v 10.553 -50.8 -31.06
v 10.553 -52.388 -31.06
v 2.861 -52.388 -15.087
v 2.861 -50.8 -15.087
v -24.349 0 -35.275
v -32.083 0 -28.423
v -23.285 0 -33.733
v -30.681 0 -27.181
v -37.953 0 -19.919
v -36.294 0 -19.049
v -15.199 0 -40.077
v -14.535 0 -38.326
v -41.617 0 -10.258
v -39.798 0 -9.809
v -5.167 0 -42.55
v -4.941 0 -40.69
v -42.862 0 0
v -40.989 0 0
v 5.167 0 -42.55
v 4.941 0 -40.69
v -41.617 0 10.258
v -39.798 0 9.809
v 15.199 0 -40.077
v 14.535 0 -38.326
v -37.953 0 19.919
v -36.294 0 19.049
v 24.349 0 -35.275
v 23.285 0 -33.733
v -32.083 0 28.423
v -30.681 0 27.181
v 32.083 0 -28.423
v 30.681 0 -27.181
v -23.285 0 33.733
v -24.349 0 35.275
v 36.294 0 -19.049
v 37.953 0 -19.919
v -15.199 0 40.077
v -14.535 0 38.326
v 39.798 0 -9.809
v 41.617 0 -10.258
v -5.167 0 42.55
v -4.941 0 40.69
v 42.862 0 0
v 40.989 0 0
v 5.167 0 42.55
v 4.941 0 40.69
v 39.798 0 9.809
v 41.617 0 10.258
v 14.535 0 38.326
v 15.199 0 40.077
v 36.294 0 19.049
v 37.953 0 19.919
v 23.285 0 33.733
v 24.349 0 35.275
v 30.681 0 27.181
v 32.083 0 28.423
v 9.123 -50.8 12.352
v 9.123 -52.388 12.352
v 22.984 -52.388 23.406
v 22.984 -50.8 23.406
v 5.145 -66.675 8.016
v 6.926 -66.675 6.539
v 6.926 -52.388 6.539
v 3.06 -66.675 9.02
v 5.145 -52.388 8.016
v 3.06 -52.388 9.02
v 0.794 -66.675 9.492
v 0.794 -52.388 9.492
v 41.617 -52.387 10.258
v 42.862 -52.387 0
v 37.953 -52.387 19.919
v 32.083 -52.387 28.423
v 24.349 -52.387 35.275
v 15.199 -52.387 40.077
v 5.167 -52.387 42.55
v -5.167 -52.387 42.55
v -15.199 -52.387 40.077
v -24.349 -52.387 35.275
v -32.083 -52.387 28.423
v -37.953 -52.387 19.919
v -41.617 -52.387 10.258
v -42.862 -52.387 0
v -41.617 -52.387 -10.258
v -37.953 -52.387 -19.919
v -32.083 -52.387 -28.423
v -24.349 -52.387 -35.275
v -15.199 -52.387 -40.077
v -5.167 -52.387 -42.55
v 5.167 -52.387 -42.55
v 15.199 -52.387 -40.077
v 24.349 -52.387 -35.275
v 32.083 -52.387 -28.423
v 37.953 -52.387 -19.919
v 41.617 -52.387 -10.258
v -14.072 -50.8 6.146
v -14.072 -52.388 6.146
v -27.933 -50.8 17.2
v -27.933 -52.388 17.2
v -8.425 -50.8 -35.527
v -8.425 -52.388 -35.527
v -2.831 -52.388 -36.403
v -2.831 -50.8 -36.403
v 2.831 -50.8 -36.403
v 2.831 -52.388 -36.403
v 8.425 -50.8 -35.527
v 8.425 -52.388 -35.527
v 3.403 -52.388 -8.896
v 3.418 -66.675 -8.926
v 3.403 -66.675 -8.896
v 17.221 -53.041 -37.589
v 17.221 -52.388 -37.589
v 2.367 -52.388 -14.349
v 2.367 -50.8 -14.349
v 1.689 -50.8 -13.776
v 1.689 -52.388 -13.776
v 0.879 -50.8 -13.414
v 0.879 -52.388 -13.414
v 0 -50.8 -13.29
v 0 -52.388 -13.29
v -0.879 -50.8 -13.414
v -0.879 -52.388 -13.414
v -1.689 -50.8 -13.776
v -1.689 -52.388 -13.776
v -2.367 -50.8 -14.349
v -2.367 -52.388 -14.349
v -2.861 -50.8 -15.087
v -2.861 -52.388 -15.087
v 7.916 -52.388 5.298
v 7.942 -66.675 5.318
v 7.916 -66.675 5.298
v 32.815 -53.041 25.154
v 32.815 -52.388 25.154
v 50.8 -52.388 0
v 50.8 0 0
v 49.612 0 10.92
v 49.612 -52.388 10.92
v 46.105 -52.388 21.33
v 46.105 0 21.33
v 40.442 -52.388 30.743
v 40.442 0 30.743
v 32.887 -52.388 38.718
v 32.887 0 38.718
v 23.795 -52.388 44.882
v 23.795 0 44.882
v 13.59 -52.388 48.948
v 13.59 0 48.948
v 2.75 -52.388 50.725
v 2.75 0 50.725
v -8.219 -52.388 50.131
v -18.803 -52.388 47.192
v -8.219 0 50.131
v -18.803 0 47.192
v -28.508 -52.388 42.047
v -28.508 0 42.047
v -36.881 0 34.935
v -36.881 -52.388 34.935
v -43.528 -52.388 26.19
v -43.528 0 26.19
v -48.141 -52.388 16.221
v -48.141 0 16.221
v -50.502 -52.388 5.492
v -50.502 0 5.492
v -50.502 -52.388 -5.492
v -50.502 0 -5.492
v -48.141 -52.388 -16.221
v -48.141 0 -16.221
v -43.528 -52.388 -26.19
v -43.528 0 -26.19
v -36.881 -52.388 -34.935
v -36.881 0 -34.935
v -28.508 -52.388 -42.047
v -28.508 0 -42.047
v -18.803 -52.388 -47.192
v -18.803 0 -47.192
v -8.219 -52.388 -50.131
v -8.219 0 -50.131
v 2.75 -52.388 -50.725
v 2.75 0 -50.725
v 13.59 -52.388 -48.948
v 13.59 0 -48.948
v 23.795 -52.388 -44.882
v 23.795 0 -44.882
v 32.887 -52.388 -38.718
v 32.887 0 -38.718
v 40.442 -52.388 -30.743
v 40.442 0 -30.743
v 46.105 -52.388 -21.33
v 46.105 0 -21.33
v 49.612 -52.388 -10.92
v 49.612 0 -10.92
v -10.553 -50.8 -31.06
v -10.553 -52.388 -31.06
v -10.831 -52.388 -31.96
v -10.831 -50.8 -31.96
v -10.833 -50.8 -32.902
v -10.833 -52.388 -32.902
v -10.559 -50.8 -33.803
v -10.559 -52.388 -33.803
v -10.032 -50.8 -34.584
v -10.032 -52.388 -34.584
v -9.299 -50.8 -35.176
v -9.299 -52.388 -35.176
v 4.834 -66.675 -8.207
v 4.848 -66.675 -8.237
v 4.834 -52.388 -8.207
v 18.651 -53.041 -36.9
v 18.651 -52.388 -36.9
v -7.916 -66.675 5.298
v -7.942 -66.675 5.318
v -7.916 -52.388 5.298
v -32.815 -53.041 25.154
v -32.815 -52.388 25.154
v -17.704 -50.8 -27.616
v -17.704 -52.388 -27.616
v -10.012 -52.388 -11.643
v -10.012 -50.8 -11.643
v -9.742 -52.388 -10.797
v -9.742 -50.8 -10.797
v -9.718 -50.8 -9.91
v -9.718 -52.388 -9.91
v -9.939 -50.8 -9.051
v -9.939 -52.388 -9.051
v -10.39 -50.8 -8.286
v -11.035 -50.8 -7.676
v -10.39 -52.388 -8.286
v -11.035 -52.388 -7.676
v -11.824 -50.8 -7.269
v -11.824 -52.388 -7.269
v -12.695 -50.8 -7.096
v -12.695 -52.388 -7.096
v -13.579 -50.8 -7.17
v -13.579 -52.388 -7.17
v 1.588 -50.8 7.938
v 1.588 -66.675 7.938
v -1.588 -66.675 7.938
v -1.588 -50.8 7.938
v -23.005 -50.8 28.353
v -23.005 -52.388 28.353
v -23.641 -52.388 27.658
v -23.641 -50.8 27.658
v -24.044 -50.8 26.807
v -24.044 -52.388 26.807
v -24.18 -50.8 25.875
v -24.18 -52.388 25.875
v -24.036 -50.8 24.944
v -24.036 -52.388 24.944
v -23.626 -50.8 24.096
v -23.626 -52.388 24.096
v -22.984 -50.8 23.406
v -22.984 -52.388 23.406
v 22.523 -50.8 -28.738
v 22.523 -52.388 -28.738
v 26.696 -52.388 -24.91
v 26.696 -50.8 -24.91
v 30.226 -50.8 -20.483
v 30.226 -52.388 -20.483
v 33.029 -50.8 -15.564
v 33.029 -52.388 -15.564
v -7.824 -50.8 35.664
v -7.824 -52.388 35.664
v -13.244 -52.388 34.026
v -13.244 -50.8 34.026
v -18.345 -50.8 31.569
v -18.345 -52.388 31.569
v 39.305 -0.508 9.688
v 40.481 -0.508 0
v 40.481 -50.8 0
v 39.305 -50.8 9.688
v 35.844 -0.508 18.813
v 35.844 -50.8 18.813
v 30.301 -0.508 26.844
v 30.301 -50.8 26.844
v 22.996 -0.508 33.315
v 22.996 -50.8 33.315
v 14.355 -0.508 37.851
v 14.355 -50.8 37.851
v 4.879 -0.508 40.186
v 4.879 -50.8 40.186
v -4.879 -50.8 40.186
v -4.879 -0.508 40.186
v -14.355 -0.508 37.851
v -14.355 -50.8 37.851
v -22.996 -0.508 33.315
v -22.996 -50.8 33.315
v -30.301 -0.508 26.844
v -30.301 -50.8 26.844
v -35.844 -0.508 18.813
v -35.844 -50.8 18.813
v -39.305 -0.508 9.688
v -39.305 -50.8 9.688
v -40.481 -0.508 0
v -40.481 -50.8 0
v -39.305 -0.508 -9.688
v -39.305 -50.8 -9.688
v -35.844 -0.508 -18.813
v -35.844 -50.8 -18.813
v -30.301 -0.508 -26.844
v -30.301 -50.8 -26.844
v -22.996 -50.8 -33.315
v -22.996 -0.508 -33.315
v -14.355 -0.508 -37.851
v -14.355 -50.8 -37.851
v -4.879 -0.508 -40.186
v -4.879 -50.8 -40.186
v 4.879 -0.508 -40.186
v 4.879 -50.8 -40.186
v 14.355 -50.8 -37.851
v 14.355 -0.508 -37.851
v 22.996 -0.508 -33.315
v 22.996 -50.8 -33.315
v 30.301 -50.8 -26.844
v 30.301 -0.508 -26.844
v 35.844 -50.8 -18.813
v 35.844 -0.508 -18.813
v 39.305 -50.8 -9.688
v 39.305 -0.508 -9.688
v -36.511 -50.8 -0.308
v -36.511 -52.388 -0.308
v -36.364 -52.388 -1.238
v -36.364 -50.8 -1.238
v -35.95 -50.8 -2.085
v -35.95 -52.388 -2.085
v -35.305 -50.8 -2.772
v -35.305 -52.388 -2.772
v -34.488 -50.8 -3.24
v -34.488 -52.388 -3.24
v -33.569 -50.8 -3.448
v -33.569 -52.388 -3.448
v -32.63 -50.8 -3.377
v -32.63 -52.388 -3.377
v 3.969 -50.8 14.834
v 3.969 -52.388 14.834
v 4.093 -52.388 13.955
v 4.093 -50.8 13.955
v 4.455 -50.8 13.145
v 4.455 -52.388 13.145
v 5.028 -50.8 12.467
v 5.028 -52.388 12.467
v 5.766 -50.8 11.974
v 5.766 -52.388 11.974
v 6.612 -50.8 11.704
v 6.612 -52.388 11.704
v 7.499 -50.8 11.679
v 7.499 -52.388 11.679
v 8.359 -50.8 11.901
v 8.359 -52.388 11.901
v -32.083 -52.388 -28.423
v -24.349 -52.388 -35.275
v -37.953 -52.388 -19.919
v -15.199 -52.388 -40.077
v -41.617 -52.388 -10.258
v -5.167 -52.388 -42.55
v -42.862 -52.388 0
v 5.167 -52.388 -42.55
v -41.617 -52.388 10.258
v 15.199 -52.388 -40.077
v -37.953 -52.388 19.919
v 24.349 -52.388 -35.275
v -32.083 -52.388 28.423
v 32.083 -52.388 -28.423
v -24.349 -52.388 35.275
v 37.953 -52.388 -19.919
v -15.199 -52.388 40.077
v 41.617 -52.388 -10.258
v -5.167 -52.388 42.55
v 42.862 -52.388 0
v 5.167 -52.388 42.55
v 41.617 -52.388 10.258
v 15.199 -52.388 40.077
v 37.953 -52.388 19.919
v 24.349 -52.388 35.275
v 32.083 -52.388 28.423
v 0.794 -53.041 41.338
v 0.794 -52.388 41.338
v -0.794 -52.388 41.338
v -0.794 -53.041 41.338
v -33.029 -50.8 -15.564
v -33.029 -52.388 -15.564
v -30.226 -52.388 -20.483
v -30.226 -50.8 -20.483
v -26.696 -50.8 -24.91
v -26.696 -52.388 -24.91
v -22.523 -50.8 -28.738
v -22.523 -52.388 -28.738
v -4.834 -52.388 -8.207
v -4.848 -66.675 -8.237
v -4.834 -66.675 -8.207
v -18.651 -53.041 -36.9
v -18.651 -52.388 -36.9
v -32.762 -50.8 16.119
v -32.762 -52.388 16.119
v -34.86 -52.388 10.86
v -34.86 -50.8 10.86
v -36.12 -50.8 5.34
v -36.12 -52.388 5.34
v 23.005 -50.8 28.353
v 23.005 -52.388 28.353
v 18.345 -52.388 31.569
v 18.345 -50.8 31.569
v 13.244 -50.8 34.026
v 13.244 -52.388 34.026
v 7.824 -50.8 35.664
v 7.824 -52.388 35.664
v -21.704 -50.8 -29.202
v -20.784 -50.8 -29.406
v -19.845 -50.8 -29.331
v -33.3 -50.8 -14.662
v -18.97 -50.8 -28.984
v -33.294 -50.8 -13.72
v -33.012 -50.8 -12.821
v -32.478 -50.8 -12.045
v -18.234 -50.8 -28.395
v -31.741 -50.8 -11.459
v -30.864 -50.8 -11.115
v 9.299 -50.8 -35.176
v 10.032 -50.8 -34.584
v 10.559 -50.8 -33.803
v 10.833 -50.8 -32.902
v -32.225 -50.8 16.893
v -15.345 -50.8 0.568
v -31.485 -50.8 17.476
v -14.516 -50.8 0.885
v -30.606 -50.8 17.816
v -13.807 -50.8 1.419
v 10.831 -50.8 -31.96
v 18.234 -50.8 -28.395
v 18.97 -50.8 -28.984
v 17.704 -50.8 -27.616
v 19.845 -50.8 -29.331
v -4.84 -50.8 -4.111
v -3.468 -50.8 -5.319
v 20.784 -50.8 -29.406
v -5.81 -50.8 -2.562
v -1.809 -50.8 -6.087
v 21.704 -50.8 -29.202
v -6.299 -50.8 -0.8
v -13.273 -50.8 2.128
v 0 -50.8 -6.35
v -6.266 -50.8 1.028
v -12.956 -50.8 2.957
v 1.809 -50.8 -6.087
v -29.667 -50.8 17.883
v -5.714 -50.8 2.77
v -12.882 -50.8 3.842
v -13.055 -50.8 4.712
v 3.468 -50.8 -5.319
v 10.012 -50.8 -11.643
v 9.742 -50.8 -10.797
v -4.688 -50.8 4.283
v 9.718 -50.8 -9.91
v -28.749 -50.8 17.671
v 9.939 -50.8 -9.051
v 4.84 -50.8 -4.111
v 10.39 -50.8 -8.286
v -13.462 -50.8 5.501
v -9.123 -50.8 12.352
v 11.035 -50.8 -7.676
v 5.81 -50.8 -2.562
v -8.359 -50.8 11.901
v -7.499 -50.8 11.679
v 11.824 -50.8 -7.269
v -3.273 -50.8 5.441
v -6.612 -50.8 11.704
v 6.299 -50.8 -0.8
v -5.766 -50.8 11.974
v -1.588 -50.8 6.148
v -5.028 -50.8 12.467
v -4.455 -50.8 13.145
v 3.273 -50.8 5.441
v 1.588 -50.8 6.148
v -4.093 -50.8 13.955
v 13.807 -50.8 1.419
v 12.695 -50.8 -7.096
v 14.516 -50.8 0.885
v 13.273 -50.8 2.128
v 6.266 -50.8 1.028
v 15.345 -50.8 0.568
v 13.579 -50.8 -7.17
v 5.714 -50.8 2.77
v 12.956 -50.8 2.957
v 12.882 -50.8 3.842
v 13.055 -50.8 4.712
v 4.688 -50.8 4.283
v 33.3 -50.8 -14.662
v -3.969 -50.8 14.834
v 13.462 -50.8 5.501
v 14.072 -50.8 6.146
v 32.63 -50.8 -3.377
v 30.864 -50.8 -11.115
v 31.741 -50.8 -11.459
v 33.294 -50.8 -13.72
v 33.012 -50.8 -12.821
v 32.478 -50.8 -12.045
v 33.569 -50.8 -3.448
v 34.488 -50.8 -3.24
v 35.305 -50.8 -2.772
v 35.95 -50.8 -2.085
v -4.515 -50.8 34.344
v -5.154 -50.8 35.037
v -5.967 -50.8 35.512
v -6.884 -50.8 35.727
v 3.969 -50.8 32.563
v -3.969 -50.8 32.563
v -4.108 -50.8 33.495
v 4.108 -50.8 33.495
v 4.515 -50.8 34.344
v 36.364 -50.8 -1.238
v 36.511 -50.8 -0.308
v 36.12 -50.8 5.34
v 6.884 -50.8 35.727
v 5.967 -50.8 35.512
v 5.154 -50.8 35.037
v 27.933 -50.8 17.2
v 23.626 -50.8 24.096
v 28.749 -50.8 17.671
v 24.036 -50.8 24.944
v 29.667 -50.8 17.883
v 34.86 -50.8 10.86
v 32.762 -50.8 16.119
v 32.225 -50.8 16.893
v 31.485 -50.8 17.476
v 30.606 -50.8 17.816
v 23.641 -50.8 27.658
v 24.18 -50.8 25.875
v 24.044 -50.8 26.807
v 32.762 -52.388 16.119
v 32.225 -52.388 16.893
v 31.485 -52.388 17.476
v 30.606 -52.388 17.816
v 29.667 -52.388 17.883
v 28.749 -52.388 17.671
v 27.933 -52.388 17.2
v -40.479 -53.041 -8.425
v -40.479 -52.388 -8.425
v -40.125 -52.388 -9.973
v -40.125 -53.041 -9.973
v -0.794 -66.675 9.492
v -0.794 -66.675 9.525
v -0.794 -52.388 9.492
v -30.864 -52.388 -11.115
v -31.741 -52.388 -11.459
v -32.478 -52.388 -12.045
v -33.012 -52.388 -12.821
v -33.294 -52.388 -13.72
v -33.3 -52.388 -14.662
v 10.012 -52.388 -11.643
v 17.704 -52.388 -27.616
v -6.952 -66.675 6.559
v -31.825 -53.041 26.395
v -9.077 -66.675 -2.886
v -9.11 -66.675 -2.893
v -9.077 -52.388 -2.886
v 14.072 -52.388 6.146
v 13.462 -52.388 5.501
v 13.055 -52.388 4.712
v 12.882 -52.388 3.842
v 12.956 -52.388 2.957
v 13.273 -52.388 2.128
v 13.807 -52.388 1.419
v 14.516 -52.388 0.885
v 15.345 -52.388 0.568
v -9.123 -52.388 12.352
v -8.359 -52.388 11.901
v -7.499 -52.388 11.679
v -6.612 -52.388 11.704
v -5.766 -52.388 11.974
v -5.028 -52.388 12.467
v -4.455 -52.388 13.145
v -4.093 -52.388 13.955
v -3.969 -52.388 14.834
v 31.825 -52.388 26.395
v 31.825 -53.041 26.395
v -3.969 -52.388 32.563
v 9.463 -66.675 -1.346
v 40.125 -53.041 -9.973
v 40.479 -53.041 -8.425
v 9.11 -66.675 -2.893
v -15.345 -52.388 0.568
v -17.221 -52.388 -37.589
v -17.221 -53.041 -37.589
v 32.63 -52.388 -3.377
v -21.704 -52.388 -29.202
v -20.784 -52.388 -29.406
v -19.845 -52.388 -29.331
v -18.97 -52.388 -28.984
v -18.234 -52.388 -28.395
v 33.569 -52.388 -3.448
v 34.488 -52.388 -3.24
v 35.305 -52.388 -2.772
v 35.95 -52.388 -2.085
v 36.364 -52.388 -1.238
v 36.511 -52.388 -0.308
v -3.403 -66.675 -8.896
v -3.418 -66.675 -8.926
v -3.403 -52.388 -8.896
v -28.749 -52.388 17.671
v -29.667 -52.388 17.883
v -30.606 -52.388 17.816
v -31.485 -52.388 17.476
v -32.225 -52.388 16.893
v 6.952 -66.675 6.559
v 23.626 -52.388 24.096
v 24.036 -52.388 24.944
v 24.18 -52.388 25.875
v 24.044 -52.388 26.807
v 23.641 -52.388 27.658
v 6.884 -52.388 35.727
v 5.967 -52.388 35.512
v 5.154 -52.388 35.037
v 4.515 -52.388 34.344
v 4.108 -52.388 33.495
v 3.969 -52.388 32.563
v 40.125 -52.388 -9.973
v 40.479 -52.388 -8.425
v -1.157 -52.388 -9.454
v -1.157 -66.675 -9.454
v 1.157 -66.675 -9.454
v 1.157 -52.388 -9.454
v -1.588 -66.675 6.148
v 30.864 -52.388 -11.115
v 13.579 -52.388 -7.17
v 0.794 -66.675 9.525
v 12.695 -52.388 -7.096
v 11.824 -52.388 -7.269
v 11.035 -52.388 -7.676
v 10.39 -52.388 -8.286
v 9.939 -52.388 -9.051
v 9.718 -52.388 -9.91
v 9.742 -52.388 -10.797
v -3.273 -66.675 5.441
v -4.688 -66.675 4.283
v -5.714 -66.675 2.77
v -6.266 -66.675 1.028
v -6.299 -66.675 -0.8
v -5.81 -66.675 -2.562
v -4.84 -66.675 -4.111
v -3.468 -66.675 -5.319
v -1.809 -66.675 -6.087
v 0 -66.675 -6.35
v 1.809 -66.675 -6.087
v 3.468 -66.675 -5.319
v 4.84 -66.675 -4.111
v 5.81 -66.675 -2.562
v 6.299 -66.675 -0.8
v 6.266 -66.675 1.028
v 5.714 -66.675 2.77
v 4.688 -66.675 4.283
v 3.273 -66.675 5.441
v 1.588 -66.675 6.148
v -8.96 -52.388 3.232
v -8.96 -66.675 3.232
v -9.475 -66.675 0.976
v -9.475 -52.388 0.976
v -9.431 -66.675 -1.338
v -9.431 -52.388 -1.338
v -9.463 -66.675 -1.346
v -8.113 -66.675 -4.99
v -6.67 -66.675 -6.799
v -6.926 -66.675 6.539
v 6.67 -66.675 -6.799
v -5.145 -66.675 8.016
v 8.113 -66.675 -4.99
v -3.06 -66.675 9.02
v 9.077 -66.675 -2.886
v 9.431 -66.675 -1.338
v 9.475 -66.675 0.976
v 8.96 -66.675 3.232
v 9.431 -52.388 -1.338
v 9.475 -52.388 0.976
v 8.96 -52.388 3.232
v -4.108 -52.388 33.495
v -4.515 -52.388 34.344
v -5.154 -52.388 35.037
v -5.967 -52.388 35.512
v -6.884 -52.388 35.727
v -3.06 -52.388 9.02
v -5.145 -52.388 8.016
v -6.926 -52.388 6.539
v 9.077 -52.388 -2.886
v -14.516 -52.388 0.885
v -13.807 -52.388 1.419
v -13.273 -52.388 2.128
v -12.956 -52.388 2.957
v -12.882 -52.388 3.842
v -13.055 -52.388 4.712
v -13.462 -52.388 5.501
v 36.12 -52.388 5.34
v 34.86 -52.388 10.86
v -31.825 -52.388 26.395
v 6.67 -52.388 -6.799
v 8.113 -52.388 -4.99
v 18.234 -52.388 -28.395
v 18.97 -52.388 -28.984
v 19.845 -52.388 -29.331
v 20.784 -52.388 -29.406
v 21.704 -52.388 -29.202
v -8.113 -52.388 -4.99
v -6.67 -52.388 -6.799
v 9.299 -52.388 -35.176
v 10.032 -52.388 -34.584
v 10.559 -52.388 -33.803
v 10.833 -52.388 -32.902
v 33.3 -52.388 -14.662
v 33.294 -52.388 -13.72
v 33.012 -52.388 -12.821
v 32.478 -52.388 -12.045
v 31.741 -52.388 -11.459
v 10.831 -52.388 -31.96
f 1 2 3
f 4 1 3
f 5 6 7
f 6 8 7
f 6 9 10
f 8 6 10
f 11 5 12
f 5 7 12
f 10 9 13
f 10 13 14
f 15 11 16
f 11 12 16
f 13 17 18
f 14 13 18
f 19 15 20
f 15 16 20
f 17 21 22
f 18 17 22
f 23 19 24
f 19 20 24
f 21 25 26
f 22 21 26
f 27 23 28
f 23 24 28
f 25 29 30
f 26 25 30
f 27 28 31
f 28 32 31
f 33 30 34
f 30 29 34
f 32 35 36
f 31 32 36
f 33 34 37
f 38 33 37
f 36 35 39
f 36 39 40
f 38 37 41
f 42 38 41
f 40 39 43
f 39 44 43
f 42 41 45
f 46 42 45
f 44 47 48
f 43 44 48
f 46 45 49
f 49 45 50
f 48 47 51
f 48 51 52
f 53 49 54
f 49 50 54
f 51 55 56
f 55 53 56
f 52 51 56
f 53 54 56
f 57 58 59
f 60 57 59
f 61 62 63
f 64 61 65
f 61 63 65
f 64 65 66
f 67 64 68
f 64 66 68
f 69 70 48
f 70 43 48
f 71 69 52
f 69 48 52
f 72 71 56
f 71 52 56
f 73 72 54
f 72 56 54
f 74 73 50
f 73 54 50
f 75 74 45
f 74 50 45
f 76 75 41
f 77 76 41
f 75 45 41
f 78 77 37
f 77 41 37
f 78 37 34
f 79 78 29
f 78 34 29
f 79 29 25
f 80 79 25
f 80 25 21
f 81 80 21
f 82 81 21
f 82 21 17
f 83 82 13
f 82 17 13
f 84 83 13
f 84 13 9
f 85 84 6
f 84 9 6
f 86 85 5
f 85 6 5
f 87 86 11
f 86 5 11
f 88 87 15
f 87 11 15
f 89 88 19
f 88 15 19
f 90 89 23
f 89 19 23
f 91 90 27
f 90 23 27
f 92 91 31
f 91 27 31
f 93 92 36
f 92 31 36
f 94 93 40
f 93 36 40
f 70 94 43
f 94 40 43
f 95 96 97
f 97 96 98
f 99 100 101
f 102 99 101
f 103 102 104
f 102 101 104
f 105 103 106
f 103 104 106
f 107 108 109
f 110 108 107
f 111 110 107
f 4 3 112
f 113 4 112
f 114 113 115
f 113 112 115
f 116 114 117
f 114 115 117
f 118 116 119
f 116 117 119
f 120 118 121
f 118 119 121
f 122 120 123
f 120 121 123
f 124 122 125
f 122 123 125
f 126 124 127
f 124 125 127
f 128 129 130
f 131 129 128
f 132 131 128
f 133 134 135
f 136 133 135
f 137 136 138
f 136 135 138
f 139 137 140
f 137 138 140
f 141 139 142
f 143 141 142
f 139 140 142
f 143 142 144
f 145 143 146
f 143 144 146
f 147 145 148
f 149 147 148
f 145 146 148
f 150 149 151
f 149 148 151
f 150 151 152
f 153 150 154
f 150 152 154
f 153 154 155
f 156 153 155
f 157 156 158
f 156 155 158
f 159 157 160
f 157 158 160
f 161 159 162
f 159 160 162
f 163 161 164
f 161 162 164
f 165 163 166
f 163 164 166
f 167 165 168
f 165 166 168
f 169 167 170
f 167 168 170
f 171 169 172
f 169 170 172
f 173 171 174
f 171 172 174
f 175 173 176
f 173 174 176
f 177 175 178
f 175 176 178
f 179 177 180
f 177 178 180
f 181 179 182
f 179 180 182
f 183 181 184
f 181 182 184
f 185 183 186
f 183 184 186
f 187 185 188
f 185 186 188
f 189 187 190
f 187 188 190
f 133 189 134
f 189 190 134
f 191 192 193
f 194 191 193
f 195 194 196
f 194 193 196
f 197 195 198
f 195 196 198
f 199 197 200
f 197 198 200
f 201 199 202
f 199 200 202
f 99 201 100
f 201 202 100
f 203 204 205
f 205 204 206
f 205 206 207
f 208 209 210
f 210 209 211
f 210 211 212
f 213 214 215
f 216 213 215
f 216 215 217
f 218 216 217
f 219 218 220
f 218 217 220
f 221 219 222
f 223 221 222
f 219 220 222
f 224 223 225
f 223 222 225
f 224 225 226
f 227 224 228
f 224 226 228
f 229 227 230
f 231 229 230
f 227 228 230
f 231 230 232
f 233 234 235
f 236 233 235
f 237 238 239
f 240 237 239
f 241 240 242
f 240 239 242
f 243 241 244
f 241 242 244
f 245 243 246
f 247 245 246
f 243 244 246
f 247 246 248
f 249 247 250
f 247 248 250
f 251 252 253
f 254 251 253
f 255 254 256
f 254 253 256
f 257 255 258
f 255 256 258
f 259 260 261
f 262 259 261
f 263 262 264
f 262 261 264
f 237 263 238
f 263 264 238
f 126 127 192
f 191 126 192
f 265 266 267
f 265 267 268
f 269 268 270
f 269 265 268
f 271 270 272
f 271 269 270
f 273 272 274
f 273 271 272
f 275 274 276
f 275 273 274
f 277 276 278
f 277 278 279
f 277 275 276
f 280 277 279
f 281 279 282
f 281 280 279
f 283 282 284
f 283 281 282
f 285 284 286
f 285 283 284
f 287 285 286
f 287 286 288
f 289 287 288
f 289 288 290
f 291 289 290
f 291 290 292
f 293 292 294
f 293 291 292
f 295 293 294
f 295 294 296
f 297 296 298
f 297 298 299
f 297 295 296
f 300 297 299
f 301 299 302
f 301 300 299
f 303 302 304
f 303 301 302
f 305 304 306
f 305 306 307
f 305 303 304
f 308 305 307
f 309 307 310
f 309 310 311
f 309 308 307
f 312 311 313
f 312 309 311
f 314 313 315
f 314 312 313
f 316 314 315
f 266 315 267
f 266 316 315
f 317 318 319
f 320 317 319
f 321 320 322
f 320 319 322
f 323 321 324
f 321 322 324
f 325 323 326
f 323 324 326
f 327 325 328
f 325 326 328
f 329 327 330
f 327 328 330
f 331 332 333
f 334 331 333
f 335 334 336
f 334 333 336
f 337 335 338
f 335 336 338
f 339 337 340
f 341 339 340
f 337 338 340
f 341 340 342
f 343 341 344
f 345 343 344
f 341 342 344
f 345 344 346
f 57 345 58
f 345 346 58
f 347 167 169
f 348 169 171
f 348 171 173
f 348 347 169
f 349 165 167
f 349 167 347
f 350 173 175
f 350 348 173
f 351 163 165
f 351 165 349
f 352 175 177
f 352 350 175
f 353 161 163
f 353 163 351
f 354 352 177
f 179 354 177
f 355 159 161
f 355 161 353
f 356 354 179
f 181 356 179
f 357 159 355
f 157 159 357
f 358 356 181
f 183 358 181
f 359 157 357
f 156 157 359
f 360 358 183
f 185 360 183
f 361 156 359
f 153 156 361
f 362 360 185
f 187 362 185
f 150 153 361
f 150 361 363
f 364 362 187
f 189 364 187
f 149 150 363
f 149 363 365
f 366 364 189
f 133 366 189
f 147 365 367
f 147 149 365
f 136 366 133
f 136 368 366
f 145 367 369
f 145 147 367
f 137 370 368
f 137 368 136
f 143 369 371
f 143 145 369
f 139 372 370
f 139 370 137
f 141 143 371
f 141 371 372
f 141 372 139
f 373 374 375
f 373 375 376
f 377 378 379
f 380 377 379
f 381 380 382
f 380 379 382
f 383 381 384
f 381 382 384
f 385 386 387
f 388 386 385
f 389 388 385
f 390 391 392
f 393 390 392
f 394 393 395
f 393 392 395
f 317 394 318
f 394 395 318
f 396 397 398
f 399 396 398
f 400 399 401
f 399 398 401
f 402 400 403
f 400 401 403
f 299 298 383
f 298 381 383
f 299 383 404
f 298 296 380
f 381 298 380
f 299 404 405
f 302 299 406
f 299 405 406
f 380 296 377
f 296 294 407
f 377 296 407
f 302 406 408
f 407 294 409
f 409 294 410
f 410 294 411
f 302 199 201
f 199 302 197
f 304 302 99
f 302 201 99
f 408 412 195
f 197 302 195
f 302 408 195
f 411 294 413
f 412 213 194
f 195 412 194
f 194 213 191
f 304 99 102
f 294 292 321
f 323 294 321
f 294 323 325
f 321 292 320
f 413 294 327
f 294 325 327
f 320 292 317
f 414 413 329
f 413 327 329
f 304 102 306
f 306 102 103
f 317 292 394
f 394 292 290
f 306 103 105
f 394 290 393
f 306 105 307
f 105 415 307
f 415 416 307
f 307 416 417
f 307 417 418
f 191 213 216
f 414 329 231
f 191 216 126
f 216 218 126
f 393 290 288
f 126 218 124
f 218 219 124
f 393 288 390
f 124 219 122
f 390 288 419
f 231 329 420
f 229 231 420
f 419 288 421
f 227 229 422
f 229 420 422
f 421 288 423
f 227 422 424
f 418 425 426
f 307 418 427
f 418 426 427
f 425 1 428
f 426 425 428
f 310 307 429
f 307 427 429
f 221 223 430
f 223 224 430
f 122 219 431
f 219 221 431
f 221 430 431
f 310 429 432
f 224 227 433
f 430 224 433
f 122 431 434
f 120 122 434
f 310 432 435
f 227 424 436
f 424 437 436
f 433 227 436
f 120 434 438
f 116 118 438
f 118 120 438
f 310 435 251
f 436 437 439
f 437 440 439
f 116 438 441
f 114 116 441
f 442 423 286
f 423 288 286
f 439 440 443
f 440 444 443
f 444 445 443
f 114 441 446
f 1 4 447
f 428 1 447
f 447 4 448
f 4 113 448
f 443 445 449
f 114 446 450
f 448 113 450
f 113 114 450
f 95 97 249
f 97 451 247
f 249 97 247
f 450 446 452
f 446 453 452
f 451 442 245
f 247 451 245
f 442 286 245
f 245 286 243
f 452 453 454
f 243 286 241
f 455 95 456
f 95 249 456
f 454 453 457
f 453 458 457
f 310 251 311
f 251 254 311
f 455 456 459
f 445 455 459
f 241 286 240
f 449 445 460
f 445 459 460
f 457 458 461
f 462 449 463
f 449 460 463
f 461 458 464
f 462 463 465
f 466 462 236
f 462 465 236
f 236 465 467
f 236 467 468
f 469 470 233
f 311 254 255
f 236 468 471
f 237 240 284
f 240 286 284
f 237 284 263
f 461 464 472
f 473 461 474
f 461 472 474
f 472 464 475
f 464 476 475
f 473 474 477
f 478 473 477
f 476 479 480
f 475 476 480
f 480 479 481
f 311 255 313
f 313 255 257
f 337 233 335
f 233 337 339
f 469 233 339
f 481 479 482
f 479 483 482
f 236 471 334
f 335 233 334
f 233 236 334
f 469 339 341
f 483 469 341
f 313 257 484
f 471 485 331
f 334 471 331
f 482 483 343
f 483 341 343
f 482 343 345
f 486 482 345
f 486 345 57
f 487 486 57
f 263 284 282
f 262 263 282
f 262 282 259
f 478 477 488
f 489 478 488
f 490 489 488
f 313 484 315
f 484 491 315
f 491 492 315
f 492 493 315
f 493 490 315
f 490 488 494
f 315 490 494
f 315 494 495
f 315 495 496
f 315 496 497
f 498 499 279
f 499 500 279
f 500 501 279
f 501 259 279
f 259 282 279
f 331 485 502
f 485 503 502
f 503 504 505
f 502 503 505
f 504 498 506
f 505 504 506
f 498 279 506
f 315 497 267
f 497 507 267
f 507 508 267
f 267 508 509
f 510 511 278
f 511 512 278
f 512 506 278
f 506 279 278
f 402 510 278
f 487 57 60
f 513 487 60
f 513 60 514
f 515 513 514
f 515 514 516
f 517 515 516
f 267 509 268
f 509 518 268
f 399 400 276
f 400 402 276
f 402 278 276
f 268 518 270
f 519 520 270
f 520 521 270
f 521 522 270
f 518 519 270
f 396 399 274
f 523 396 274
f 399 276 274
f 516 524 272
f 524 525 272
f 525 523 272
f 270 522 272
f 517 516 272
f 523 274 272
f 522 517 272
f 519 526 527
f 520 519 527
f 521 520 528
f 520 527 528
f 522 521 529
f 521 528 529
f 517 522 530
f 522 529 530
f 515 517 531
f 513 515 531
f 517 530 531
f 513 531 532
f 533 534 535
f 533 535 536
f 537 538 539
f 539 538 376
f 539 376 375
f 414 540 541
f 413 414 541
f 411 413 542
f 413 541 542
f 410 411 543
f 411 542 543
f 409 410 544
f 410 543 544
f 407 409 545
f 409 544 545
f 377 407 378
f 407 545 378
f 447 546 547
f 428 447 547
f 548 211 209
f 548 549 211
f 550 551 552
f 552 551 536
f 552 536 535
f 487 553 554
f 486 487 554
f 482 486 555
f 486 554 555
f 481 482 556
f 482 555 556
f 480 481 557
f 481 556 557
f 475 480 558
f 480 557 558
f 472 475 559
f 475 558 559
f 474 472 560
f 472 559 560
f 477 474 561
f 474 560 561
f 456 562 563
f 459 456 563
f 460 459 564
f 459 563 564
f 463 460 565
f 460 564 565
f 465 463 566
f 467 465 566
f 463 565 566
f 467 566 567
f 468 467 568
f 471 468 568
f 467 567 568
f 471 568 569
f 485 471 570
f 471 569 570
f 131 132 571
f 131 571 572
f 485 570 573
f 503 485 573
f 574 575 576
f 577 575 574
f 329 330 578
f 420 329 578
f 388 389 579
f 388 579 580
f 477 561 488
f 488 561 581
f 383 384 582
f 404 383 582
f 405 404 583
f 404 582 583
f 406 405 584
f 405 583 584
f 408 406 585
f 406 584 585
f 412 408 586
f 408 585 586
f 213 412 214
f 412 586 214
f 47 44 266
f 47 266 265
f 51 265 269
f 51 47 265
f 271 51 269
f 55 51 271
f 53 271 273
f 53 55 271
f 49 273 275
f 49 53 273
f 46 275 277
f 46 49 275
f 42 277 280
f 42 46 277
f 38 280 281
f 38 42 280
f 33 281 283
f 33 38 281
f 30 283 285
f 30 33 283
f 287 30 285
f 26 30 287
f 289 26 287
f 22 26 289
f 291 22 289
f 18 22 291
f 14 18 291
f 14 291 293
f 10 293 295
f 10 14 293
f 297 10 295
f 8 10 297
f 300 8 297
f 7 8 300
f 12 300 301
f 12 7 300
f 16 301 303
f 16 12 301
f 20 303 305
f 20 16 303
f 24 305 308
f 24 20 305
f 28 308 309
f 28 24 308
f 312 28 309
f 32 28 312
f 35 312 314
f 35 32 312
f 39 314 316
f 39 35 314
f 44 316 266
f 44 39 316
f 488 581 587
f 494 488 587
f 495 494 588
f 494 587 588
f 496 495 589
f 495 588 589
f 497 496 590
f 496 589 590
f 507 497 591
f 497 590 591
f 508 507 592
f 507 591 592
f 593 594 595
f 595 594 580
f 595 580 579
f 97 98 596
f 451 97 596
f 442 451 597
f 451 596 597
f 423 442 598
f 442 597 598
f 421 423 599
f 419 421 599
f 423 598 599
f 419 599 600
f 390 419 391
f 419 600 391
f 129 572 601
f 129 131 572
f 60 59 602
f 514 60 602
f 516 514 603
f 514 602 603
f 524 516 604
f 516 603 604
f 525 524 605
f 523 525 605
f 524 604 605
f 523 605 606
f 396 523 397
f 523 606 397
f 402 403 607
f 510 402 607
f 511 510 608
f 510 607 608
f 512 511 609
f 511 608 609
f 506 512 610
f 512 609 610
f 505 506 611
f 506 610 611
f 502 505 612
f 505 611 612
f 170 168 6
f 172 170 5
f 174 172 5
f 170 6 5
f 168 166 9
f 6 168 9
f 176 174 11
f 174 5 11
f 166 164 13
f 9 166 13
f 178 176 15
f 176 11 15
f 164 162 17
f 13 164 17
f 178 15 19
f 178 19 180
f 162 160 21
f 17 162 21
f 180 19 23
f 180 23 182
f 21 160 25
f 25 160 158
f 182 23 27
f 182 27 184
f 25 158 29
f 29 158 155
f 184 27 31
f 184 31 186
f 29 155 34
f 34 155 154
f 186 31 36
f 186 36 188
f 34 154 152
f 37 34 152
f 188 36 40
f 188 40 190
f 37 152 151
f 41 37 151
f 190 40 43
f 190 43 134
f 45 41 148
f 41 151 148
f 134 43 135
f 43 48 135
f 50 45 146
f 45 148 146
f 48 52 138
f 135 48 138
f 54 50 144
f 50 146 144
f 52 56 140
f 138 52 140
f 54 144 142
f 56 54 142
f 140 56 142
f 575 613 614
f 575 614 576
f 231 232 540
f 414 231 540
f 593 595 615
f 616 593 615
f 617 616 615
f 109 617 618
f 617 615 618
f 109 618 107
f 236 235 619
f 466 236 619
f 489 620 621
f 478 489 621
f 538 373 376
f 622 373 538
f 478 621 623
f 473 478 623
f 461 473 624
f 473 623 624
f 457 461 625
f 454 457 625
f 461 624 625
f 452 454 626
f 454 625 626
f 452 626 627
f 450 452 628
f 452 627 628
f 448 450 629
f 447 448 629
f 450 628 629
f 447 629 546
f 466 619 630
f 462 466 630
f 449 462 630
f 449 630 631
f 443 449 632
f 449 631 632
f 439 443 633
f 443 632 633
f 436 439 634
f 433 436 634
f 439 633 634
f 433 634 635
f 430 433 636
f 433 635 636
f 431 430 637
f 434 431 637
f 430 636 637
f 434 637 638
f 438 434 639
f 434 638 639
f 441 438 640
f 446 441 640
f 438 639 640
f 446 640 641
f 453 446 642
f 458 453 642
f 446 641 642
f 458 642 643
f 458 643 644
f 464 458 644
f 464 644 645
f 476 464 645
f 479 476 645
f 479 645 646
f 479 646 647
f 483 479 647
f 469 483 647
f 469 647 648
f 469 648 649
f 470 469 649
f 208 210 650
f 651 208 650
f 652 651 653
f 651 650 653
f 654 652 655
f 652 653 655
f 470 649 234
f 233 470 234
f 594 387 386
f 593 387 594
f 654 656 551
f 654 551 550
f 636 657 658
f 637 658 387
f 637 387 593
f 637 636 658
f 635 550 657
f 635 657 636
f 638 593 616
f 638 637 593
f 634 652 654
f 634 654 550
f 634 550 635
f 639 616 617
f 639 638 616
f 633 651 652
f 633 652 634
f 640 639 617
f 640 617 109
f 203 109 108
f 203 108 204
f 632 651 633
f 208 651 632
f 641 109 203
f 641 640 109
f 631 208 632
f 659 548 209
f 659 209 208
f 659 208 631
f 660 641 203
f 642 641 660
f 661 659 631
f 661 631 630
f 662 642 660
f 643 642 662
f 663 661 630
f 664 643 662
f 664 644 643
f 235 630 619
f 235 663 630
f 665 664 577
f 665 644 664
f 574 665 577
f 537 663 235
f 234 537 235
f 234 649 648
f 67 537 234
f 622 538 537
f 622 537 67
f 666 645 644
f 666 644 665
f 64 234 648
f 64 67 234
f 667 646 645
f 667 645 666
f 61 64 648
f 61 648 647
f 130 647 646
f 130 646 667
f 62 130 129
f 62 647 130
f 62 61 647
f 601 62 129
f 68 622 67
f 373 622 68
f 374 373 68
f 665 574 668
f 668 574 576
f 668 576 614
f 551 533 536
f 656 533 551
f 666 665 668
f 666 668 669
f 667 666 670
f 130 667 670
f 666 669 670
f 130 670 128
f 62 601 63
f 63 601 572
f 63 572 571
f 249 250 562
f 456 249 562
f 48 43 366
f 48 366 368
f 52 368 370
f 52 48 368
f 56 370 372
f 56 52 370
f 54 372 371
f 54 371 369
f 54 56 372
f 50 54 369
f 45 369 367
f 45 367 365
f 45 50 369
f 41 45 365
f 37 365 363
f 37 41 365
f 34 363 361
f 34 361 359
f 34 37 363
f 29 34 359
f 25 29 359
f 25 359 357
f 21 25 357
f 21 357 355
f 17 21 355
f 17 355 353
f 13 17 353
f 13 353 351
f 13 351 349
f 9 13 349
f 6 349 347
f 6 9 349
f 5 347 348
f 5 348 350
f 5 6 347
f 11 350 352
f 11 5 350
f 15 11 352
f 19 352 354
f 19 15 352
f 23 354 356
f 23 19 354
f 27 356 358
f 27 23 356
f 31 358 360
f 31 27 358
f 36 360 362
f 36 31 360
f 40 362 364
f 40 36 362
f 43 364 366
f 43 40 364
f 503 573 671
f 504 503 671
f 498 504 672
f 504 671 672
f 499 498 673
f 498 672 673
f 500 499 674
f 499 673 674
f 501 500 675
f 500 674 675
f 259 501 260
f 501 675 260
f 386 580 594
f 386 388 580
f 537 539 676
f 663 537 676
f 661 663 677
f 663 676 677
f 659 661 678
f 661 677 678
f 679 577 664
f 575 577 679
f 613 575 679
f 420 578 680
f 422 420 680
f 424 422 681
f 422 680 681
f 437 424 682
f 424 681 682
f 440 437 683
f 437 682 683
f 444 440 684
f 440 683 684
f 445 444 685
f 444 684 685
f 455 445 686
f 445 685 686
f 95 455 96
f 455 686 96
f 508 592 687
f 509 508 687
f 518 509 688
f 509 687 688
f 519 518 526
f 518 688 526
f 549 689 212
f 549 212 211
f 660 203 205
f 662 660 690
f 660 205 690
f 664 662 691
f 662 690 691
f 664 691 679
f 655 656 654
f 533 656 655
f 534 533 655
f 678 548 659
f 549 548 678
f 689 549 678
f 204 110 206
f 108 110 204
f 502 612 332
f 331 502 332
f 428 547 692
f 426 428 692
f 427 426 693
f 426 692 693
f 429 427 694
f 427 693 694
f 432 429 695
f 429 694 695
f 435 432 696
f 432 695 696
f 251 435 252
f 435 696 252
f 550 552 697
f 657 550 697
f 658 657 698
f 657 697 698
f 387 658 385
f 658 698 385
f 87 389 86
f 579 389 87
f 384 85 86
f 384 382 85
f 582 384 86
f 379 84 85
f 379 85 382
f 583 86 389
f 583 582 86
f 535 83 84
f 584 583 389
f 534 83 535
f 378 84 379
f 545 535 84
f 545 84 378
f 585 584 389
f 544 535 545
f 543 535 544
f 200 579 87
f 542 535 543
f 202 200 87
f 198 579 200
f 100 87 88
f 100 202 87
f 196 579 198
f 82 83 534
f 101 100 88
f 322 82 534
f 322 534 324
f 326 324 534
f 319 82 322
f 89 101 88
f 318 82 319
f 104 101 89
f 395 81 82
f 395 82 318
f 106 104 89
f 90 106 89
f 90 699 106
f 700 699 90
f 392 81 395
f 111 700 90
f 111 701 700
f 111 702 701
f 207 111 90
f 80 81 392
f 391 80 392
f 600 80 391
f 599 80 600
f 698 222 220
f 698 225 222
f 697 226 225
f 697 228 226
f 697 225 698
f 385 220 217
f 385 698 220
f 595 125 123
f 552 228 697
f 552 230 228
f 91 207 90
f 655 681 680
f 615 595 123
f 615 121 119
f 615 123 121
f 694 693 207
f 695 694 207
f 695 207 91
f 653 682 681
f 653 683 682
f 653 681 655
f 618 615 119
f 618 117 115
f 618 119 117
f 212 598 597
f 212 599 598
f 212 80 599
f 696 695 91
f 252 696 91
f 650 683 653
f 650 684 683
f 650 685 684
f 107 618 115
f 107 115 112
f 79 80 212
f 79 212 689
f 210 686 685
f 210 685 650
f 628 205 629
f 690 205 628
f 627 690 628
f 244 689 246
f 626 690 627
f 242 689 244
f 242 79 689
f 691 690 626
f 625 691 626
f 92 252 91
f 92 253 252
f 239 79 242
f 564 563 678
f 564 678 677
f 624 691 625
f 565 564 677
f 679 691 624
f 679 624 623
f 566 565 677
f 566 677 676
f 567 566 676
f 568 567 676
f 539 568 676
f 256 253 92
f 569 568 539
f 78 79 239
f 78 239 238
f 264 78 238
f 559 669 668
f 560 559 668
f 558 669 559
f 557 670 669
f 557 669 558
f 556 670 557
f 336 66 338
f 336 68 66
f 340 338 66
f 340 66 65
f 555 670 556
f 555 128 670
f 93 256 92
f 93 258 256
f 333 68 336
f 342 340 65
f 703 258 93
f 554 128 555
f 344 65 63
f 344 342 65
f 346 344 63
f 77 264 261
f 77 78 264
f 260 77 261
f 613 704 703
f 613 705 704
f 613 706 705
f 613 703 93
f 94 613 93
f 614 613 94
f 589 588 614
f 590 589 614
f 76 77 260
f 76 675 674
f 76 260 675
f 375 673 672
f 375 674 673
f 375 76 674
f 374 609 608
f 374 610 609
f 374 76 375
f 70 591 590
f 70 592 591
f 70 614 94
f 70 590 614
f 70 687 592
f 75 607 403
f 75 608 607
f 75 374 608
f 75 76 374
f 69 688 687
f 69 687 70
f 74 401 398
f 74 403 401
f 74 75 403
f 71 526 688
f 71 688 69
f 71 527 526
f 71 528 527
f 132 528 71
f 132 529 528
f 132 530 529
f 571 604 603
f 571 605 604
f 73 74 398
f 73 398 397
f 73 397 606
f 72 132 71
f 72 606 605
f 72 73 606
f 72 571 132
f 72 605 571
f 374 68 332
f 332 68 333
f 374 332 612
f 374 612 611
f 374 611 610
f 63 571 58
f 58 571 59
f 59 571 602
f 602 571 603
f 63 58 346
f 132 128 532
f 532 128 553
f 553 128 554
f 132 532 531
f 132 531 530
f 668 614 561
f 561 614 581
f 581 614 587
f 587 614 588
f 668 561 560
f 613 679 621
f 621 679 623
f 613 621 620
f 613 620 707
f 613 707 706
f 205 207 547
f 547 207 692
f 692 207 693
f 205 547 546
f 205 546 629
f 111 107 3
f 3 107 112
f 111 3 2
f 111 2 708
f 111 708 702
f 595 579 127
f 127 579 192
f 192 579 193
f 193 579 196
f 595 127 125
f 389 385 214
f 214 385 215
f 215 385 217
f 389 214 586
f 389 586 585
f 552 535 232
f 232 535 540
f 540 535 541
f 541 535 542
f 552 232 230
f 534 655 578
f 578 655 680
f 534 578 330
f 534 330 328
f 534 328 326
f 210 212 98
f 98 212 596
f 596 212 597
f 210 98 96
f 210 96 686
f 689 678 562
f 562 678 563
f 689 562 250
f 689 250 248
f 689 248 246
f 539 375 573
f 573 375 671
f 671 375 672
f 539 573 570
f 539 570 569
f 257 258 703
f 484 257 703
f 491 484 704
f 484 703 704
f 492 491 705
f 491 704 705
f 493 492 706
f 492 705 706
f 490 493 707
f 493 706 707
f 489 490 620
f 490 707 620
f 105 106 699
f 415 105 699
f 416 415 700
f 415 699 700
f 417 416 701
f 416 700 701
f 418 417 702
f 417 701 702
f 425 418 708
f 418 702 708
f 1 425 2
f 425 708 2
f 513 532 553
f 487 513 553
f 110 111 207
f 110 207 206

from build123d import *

# Parameters (mm, degrees)
F0_R      = 42.8625
F0_R_2    = 40.48125
F1_DEPTH  = 50.8
F2_R      = 42.8625
F3_DEPTH  = 1.5875
F4_R      = 9.525
F5_DEPTH  = 14.2875
F7_DEPTH  = 0.79375
F8_COUNT  = 7
F10_DEPTH = 66.676
F11_R     = 50.8
F11_R_2   = 42.8625
F12_DEPTH = 52.3875
F14_DEPTH = 1.5875
F15_SIZE  = 0.508


with BuildPart() as f1:
    # F0 (on Front) → F1 (new body)
    with BuildSketch(Plane.XZ):
        Circle(F0_R)
        Circle(F0_R_2, mode=Mode.SUBTRACT)
    extrude(amount=F1_DEPTH)

    # F2 (on face) → F3 (join)
    with BuildSketch(Plane.XZ.offset(50.8)):
        Circle(F2_R)
    extrude(amount=F3_DEPTH)

    # F4 (on face) → F5 (join)
    with BuildSketch(Plane.XZ.offset(52.3875)):
        Circle(F4_R)
    extrude(amount=F5_DEPTH)



with BuildPart() as f7:
    # F6 (on Right) → F7 (new body, symmetric)
    with BuildSketch(Plane.YZ):
        Polygon((-66.675, 4.5089146682), (-52.3875, 4.5089146682), (-52.3875, 41.3385), (-53.0406428571, 41.3385), (-66.675, 9.525), align=None)
    extrude(amount=F7_DEPTH, both=True)


with BuildPart() as f1_1:
    add(f1.part)

    add(f7.part)  # F8 merges F7
    # F8: F7 ×7 about axis
    f8_axis = Axis((0, -40.6418209895, 0), (0, 1, 0))
    for i in range(1, F8_COUNT):
        add(f7.part.rotate(f8_axis, i * 360 / F8_COUNT))

    # F9 (on face) → F10 (cut, through all)
    with BuildSketch(Plane.XZ.offset(66.675)):
        with BuildLine():
            Line((-1.5875, 7.9375), (-1.5875, 6.1483610621))
            ThreePointArc((-1.5875, 6.1483610621), (0, -6.35), (1.5875, 6.1483610621))
            Line((1.5875, 6.1483610621), (1.5875, 7.9375))
            Line((1.5875, 7.9375), (-1.5875, 7.9375))
        make_face()
    extrude(amount=-F10_DEPTH, mode=Mode.SUBTRACT)

    # F13 (on face) → F14 (cut, through all)
    with BuildSketch(Plane.XZ.offset(52.3875)):
        with BuildLine():
            Line((10.5528811268, -31.0603190369), (2.8605761556, -15.0870831752))
            ThreePointArc((2.8605761556, -15.0870831752), (0, -13.2896640469), (-2.8605761556, -15.0870831752))
            Line((-2.8605761556, -15.0870831752), (-10.5528811268, -31.0603190369))
            ThreePointArc((-10.5528811268, -31.0603190369), (-10.558668331, -33.8033983853), (-8.4249054446, -35.5272237094))
            ThreePointArc((-8.4249054446, -35.5272237094), (0, -36.5125), (8.4249054446, -35.5272237094))
            ThreePointArc((8.4249054446, -35.5272237094), (10.558668331, -33.8033983853), (10.5528811268, -31.0603190369))
        make_face()
        with BuildLine():
            Line((30.8635490413, -11.1152174663), (13.5790966655, -7.1701540031))
            ThreePointArc((13.5790966655, -7.1701540031), (10.3902777433, -8.2859700034), (10.0120165446, -11.643130996))
            Line((10.0120165446, -11.643130996), (17.7043215158, -27.6163668577))
            ThreePointArc((17.7043215158, -27.6163668577), (19.8453390464, -29.3311734755), (22.5234593543, -28.7377179846))
            ThreePointArc((22.5234593543, -28.7377179846), (28.5466220036, -22.7651713904), (33.0291446071, -15.5640053577))
            ThreePointArc((33.0291446071, -15.5640053577), (33.0117830976, -12.8209748473), (30.8635490413, -11.1152174663))
        make_face()
        with BuildLine():
            Line((27.9333350261, 17.1998695655), (14.0722804232, 6.1460473778))
            ThreePointArc((14.0722804232, 6.1460473778), (12.9564644229, 2.9572284557), (15.3453565787, 0.5683362998))
            Line((15.3453565787, 0.5683362998), (32.6298089546, -3.3767271634))
            ThreePointArc((32.6298089546, -3.3767271634), (35.3054013507, -2.7719766917), (36.5111998647, -0.3081244748))
            ThreePointArc((36.5111998647, -0.3081244748), (35.5970553935, 8.1247956011), (32.7617642086, 16.1192264762))
            ThreePointArc((32.7617642086, 16.1192264762), (30.6063518741, 17.8159042509), (27.9333350261, 17.1998695655))
        make_face()
        with BuildLine():
            Line((3.96875, 32.5631040011), (3.96875, 14.8341497268))
            ThreePointArc((3.96875, 14.8341497268), (5.7661691283, 11.9735735712), (9.1233301209, 12.3518347699))
            Line((9.1233301209, 12.3518347699), (22.9843847238, 23.4056569576))
            ThreePointArc((22.9843847238, 23.4056569576), (24.179776339, 25.8745750789), (23.0052621842, 28.3534930492))
            ThreePointArc((23.0052621842, 28.3534930492), (15.8421800245, 32.8966257893), (7.8241071429, 35.6643520012))
            ThreePointArc((7.8241071429, 35.6643520012), (5.1537134336, 35.03704407), (3.96875, 32.5631040011))
        make_face()
        with BuildLine():
            Line((-22.9843847238, 23.4056569576), (-9.1233301209, 12.3518347699))
            ThreePointArc((-9.1233301209, 12.3518347699), (-5.7661691283, 11.9735735712), (-3.96875, 14.8341497268))
            Line((-3.96875, 14.8341497268), (-3.96875, 32.5631040011))
            ThreePointArc((-3.96875, 32.5631040011), (-5.1537134336, 35.03704407), (-7.8241071429, 35.6643520012))
            ThreePointArc((-7.8241071429, 35.6643520012), (-15.8421800245, 32.8966257893), (-23.0052621842, 28.3534930492))
            ThreePointArc((-23.0052621842, 28.3534930492), (-24.179776339, 25.8745750789), (-22.9843847238, 23.4056569576))
        make_face()
        with BuildLine():
            Line((-32.6298089546, -3.3767271634), (-15.3453565787, 0.5683362998))
            ThreePointArc((-15.3453565787, 0.5683362998), (-12.9564644229, 2.9572284557), (-14.0722804232, 6.1460473778))
            Line((-14.0722804232, 6.1460473778), (-27.9333350261, 17.1998695655))
            ThreePointArc((-27.9333350261, 17.1998695655), (-30.6063518741, 17.8159042509), (-32.7617642086, 16.1192264762))
            ThreePointArc((-32.7617642086, 16.1192264762), (-35.5970553935, 8.1247956011), (-36.5111998647, -0.3081244748))
            ThreePointArc((-36.5111998647, -0.3081244748), (-35.3054013507, -2.7719766917), (-32.6298089546, -3.3767271634))
        make_face()
        with BuildLine():
            Line((-17.7043215158, -27.6163668577), (-10.0120165446, -11.643130996))
            ThreePointArc((-10.0120165446, -11.643130996), (-10.3902777433, -8.2859700034), (-13.5790966655, -7.1701540031))
            Line((-13.5790966655, -7.1701540031), (-30.8635490413, -11.1152174663))
            ThreePointArc((-30.8635490413, -11.1152174663), (-33.0117830976, -12.8209748473), (-33.0291446071, -15.5640053577))
            ThreePointArc((-33.0291446071, -15.5640053577), (-28.5466220036, -22.7651713904), (-22.5234593543, -28.7377179846))
            ThreePointArc((-22.5234593543, -28.7377179846), (-19.8453390464, -29.3311734755), (-17.7043215158, -27.6163668577))
        make_face()
    extrude(amount=-F14_DEPTH, mode=Mode.SUBTRACT)

    # F15
    f15_edges = [f1_1.edges().sort_by_distance(p)[0] for p in [
        (-40.48125, 0, 0),
    ]]
    chamfer(f15_edges, length=F15_SIZE)


with BuildPart() as f12:
    # F11 (on Front) → F12 (new body, through all)
    with BuildSketch(Plane.XZ):
        Circle(F11_R)
        Circle(F11_R_2, mode=Mode.SUBTRACT)
    extrude(amount=F12_DEPTH)


solid = Compound([f1_1.part, f12.part])
